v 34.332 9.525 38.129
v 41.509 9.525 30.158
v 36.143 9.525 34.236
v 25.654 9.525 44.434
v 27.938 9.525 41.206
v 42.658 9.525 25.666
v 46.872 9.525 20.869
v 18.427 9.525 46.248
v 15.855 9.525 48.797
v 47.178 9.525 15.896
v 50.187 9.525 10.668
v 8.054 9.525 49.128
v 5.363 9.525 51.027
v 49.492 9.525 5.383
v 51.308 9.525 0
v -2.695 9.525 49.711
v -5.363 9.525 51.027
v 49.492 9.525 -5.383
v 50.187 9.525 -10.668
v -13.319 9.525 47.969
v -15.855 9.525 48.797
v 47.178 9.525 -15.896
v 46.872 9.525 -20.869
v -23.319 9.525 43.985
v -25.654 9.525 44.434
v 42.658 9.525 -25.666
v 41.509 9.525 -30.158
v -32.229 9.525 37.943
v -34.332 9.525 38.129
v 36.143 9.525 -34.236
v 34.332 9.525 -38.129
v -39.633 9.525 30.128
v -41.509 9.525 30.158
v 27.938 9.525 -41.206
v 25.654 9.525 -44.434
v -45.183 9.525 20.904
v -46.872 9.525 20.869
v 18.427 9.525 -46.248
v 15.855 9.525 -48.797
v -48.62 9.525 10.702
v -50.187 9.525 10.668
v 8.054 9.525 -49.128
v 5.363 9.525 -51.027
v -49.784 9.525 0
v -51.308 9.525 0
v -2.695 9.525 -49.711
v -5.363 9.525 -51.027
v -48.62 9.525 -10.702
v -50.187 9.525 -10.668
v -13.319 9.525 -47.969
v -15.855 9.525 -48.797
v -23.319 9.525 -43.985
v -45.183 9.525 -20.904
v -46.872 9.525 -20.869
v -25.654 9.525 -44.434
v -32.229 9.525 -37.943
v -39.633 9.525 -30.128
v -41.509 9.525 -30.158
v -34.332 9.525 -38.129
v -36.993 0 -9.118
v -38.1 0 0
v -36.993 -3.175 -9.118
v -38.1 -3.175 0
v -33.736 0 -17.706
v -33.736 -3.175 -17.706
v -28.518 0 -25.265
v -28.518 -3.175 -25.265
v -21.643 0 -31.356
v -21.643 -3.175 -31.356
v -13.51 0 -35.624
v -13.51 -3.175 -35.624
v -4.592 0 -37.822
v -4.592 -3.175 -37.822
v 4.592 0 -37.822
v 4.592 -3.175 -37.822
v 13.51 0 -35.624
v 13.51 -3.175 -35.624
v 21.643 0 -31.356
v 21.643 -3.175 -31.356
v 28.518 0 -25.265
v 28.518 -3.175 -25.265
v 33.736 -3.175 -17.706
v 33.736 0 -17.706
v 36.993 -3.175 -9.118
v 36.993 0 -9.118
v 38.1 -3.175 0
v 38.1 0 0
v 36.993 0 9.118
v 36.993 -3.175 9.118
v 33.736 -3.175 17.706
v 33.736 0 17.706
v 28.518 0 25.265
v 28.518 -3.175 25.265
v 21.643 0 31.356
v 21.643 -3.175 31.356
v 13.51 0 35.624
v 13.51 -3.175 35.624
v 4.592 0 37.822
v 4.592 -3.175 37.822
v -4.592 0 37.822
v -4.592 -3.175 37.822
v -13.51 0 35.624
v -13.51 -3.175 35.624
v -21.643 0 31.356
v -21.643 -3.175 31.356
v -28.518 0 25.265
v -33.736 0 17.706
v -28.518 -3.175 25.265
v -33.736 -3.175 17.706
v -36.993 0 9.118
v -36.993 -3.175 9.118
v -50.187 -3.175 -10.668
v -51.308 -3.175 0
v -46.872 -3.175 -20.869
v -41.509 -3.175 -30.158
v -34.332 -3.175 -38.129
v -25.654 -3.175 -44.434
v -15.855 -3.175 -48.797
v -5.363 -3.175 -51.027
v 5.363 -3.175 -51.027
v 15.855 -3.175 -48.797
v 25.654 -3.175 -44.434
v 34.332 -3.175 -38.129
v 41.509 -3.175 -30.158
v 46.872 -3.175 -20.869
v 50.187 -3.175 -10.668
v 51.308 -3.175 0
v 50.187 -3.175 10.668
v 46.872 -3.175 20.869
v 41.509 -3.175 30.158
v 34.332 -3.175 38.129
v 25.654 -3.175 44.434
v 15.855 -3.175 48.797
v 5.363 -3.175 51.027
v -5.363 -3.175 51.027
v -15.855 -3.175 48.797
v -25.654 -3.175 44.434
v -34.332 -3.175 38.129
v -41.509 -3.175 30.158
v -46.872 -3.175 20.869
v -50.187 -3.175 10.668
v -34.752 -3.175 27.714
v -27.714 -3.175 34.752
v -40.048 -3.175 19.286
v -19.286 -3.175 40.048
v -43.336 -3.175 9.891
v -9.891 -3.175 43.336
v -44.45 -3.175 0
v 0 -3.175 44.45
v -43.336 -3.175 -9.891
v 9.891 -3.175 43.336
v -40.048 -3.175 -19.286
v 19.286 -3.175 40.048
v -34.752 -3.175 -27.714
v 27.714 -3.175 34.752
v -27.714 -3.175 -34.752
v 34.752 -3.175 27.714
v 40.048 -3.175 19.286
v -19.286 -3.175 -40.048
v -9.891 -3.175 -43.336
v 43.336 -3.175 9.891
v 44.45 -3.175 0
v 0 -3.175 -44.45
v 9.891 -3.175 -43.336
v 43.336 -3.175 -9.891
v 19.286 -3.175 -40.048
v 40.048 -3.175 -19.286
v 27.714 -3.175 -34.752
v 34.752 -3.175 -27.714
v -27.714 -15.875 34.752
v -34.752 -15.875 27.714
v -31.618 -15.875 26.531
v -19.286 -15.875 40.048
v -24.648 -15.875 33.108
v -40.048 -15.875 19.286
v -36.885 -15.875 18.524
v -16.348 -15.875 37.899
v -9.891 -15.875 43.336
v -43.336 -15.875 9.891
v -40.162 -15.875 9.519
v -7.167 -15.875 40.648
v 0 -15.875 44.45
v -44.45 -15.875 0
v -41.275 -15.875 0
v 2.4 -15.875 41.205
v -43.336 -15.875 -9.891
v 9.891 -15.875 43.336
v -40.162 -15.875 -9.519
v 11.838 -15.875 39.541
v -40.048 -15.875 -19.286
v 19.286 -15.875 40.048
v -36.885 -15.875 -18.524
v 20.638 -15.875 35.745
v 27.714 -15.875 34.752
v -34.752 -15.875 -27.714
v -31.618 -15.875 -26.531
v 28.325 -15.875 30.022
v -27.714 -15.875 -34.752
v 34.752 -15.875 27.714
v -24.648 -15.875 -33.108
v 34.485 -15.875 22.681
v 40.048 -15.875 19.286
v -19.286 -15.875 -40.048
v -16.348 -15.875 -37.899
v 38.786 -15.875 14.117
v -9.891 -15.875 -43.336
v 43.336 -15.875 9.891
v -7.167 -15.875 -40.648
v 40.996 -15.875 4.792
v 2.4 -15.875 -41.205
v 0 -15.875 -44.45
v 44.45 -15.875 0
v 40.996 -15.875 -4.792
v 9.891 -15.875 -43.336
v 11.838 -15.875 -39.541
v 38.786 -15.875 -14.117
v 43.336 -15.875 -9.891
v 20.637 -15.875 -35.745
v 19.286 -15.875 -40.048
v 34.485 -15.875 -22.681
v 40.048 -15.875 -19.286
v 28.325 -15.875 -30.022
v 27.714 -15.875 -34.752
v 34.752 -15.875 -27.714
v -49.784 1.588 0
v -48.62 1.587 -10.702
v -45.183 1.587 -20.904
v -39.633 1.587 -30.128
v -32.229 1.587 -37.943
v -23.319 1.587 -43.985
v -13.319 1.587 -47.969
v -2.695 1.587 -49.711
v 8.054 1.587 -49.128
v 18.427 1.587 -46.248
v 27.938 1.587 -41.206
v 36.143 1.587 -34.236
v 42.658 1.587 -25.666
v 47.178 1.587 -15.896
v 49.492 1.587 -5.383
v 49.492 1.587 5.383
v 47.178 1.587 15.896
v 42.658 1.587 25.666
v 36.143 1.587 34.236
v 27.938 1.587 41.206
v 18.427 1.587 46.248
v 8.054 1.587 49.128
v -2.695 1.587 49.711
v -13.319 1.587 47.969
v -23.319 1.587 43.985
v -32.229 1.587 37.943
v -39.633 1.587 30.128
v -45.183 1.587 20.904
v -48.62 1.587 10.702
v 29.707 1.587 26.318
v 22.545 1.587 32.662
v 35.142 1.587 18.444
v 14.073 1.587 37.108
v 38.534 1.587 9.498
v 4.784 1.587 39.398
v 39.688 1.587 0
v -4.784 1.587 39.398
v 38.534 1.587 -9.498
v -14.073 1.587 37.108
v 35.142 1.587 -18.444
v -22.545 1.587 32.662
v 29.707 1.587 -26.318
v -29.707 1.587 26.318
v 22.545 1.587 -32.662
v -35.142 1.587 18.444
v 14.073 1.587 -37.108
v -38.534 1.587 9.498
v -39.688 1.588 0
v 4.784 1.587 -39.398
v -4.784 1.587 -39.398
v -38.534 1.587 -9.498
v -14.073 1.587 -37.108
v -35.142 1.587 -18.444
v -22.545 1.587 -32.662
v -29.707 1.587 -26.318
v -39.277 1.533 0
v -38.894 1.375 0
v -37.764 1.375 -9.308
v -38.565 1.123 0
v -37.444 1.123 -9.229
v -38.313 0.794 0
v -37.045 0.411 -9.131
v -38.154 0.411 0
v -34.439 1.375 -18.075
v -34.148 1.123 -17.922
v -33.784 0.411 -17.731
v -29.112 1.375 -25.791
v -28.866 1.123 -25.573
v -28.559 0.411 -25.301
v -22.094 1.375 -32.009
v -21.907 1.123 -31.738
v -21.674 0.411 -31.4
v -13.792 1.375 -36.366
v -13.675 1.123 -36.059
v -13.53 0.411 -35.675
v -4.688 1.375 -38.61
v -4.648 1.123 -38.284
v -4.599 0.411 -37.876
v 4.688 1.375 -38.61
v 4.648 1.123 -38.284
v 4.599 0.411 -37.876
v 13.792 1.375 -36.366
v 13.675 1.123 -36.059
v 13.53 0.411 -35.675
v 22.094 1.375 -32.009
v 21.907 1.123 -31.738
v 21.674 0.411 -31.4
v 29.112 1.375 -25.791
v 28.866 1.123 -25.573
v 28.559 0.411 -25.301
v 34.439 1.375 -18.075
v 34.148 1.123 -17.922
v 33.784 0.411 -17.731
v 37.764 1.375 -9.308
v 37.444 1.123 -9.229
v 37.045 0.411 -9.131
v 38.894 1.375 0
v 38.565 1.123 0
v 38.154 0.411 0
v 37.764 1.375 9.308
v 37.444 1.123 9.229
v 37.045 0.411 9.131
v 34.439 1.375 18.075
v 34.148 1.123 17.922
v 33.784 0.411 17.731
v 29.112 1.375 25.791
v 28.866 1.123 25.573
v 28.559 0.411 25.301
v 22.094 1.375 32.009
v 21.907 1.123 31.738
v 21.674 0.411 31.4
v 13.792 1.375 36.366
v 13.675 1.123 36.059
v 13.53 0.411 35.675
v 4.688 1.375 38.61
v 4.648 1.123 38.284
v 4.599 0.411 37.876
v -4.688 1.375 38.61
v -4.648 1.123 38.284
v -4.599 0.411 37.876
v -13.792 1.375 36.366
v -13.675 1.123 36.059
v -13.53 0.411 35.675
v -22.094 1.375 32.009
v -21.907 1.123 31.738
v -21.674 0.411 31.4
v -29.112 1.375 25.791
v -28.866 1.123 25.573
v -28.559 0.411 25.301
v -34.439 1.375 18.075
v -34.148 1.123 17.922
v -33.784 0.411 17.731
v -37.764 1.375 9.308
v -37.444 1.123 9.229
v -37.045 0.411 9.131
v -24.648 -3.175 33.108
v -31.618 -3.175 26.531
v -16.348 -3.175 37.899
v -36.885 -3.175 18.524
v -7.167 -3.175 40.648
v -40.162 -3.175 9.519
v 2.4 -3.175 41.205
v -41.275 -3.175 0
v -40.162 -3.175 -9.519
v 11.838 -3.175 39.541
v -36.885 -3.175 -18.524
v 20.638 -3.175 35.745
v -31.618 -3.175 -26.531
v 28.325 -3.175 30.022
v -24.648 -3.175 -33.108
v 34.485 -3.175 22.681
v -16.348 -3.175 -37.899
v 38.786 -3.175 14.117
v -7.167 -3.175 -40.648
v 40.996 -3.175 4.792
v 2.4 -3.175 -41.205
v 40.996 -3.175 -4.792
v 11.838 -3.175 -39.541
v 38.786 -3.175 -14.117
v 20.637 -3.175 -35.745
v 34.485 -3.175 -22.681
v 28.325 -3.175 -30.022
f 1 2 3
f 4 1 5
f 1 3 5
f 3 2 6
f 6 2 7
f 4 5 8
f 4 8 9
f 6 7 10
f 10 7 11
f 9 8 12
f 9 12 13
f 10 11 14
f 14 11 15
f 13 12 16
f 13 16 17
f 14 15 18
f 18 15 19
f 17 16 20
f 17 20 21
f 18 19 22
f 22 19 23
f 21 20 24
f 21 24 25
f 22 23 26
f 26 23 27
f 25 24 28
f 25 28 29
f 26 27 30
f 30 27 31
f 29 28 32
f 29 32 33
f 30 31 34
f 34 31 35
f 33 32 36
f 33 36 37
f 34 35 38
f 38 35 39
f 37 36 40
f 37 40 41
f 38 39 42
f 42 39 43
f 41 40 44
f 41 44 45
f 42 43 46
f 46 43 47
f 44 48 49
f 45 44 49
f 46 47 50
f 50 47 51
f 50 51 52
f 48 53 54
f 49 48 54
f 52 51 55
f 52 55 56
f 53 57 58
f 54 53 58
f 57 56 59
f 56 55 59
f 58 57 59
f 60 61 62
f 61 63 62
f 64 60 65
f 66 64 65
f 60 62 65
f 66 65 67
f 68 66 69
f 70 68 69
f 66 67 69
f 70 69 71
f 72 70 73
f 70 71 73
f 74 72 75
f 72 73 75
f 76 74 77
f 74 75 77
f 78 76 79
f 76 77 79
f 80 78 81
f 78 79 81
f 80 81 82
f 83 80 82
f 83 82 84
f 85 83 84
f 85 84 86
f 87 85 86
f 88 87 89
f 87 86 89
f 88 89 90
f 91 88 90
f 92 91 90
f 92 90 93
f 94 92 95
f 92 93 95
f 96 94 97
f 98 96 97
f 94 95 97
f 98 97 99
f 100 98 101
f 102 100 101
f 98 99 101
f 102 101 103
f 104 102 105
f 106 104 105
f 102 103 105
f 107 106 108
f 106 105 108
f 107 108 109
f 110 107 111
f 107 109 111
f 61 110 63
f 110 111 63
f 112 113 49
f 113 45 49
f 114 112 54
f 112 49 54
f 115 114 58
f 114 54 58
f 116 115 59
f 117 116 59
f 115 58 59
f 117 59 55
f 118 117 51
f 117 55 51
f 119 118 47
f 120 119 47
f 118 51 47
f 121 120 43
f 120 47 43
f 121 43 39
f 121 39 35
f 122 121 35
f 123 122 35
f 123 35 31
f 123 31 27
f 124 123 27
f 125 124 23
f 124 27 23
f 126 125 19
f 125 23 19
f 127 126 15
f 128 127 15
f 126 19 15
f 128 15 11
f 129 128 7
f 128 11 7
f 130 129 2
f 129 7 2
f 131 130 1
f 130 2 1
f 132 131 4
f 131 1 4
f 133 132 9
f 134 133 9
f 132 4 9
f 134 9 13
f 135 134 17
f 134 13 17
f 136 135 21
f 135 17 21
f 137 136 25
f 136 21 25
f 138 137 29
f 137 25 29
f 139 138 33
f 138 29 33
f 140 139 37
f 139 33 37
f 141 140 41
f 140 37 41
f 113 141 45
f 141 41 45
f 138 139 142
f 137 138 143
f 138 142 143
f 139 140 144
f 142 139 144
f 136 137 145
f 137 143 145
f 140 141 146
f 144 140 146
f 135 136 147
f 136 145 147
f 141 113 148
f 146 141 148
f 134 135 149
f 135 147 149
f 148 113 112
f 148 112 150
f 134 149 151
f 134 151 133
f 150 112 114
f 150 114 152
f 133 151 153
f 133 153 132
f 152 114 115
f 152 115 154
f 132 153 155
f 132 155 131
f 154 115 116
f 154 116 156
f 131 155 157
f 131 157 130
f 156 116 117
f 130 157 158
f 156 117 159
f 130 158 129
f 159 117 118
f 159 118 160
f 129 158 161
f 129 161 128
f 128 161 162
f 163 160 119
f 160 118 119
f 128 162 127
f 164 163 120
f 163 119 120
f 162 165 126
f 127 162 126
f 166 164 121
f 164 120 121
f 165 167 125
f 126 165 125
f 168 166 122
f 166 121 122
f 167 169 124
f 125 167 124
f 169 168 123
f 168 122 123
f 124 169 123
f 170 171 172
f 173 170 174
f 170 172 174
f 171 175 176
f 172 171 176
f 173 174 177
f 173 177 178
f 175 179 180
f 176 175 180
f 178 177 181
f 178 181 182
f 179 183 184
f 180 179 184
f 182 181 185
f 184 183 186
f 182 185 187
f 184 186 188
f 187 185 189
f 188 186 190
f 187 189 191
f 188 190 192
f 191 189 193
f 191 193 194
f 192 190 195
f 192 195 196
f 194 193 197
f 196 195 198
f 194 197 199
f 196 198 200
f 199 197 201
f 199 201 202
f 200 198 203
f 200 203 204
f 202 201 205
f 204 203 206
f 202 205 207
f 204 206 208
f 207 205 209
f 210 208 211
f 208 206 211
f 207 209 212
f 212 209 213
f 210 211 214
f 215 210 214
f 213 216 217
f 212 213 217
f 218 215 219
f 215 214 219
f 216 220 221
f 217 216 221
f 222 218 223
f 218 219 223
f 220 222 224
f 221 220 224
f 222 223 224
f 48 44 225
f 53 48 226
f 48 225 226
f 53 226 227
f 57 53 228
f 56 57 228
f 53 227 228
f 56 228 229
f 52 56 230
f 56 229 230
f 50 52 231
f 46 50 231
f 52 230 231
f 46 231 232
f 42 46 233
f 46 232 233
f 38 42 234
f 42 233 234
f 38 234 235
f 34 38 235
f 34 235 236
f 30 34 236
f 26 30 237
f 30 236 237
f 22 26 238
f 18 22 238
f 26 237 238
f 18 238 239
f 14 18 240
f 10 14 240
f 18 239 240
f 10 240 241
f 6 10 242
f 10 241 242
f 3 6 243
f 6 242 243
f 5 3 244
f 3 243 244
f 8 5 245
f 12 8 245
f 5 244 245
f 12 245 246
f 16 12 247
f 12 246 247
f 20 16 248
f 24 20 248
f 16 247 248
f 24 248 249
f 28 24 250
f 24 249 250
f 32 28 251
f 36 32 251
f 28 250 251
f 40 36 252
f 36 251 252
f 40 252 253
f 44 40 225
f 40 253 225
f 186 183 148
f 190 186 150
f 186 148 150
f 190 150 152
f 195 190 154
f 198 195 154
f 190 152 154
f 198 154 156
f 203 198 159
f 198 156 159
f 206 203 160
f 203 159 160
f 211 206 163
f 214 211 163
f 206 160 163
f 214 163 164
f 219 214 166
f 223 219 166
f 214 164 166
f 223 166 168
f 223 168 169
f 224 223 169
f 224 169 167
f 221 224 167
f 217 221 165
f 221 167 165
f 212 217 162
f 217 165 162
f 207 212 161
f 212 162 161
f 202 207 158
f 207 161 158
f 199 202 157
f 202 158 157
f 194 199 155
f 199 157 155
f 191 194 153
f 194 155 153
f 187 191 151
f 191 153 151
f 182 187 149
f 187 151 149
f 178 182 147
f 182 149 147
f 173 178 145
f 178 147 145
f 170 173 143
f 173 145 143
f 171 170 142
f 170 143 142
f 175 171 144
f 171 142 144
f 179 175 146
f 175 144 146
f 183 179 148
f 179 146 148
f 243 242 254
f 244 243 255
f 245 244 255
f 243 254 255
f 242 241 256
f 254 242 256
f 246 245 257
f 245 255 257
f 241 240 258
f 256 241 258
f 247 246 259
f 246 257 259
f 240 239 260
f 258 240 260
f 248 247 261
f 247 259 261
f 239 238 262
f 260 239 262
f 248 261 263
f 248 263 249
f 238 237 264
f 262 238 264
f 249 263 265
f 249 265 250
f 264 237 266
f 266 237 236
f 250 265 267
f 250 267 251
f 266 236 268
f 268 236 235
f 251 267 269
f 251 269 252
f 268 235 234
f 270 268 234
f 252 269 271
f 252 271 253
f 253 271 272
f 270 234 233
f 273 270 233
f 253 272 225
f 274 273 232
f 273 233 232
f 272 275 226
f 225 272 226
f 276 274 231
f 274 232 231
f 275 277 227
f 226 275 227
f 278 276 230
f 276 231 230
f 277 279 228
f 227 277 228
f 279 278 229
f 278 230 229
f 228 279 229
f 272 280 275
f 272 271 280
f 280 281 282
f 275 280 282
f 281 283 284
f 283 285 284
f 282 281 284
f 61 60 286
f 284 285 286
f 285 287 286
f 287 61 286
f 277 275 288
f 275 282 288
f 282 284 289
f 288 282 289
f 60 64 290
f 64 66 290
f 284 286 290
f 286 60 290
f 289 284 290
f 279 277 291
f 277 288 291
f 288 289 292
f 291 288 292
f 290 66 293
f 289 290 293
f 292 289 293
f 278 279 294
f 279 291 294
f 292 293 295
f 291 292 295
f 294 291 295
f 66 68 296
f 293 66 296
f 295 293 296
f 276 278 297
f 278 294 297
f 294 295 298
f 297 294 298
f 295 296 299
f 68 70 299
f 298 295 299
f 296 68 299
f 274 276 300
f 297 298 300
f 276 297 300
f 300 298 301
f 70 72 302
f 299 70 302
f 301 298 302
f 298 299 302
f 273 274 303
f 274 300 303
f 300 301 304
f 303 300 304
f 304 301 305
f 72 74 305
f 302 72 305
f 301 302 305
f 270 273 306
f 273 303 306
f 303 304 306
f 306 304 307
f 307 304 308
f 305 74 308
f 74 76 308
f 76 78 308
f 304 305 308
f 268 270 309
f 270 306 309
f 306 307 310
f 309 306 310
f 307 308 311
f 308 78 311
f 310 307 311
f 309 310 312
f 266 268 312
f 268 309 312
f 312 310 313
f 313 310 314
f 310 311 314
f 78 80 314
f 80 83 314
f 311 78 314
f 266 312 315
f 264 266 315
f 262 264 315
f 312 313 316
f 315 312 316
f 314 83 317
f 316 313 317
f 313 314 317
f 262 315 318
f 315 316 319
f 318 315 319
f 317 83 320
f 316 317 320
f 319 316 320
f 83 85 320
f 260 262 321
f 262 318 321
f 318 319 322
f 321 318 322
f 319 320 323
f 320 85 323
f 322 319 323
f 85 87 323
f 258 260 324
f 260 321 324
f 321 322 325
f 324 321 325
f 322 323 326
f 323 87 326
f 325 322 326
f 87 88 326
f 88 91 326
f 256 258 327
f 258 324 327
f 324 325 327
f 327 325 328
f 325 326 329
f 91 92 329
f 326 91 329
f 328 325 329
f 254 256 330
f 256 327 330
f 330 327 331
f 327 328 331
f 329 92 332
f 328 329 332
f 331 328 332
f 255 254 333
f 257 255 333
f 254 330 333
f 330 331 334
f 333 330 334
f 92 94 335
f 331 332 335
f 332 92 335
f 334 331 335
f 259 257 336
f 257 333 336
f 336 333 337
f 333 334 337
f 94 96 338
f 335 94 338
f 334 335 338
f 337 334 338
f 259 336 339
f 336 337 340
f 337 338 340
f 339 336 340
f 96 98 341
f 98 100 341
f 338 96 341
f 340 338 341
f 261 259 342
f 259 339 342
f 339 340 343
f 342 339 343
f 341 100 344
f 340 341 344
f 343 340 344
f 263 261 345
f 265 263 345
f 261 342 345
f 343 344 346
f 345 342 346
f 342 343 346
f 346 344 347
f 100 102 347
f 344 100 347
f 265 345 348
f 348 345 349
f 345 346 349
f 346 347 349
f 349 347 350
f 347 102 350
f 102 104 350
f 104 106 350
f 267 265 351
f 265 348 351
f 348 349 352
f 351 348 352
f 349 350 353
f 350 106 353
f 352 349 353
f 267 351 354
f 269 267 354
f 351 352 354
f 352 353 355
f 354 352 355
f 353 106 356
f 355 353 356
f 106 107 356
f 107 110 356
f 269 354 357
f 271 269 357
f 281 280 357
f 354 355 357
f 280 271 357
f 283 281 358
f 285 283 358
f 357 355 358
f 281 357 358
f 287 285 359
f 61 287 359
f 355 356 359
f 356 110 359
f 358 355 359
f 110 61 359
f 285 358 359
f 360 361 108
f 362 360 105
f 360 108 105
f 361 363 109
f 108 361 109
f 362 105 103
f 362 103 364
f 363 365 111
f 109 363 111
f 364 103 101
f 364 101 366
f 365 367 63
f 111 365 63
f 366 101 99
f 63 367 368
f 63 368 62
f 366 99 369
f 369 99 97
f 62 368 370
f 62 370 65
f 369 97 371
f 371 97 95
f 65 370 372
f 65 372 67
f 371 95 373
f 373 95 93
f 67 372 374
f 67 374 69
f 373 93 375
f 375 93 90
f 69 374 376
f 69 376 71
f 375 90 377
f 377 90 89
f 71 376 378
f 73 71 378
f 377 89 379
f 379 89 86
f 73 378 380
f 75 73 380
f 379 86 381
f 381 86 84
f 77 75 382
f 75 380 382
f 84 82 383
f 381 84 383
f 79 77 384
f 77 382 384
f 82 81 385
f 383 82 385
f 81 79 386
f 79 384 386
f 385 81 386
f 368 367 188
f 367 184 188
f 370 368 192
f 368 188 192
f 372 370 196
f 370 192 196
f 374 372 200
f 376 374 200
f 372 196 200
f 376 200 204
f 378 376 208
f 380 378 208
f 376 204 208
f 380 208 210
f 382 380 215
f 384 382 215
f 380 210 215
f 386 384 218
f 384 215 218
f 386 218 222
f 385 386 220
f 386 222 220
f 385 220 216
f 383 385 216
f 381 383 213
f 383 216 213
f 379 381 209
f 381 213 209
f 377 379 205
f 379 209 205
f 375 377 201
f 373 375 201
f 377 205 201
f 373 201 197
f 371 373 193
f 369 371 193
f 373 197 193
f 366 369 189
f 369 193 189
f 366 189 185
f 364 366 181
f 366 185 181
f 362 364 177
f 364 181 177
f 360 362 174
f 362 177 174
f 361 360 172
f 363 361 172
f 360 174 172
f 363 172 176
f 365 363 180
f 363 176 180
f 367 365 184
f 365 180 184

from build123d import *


with BuildPart() as part:
    # Cross Section → Main (revolve)
    with BuildSketch(Plane.XY):
        with BuildLine():
            Line((-38.1, 0), (-38.1, -3.175))
            Line((-38.1, -3.175), (-41.275, -3.175))
            Line((-41.275, -3.175), (-41.275, -15.875))
            Line((-41.275, -15.875), (-44.45, -15.875))
            Line((-44.45, -15.875), (-44.45, -3.175))
            Line((-44.45, -3.175), (-51.308, -3.175))
            Line((-51.308, -3.175), (-51.308, 9.525))
            Line((-51.308, 9.525), (-49.784, 9.525))
            Line((-49.784, 9.525), (-49.784, 1.5875))
            Line((-49.784, 1.5875), (-39.6875, 1.5875))
            ThreePointArc((-39.6875, 1.5875), (-38.564967985, 1.122532015), (-38.1, 0))
        make_face()
    revolve(axis=Axis((0, 55, 0), (0, -1, 0)))


solid = part.part
